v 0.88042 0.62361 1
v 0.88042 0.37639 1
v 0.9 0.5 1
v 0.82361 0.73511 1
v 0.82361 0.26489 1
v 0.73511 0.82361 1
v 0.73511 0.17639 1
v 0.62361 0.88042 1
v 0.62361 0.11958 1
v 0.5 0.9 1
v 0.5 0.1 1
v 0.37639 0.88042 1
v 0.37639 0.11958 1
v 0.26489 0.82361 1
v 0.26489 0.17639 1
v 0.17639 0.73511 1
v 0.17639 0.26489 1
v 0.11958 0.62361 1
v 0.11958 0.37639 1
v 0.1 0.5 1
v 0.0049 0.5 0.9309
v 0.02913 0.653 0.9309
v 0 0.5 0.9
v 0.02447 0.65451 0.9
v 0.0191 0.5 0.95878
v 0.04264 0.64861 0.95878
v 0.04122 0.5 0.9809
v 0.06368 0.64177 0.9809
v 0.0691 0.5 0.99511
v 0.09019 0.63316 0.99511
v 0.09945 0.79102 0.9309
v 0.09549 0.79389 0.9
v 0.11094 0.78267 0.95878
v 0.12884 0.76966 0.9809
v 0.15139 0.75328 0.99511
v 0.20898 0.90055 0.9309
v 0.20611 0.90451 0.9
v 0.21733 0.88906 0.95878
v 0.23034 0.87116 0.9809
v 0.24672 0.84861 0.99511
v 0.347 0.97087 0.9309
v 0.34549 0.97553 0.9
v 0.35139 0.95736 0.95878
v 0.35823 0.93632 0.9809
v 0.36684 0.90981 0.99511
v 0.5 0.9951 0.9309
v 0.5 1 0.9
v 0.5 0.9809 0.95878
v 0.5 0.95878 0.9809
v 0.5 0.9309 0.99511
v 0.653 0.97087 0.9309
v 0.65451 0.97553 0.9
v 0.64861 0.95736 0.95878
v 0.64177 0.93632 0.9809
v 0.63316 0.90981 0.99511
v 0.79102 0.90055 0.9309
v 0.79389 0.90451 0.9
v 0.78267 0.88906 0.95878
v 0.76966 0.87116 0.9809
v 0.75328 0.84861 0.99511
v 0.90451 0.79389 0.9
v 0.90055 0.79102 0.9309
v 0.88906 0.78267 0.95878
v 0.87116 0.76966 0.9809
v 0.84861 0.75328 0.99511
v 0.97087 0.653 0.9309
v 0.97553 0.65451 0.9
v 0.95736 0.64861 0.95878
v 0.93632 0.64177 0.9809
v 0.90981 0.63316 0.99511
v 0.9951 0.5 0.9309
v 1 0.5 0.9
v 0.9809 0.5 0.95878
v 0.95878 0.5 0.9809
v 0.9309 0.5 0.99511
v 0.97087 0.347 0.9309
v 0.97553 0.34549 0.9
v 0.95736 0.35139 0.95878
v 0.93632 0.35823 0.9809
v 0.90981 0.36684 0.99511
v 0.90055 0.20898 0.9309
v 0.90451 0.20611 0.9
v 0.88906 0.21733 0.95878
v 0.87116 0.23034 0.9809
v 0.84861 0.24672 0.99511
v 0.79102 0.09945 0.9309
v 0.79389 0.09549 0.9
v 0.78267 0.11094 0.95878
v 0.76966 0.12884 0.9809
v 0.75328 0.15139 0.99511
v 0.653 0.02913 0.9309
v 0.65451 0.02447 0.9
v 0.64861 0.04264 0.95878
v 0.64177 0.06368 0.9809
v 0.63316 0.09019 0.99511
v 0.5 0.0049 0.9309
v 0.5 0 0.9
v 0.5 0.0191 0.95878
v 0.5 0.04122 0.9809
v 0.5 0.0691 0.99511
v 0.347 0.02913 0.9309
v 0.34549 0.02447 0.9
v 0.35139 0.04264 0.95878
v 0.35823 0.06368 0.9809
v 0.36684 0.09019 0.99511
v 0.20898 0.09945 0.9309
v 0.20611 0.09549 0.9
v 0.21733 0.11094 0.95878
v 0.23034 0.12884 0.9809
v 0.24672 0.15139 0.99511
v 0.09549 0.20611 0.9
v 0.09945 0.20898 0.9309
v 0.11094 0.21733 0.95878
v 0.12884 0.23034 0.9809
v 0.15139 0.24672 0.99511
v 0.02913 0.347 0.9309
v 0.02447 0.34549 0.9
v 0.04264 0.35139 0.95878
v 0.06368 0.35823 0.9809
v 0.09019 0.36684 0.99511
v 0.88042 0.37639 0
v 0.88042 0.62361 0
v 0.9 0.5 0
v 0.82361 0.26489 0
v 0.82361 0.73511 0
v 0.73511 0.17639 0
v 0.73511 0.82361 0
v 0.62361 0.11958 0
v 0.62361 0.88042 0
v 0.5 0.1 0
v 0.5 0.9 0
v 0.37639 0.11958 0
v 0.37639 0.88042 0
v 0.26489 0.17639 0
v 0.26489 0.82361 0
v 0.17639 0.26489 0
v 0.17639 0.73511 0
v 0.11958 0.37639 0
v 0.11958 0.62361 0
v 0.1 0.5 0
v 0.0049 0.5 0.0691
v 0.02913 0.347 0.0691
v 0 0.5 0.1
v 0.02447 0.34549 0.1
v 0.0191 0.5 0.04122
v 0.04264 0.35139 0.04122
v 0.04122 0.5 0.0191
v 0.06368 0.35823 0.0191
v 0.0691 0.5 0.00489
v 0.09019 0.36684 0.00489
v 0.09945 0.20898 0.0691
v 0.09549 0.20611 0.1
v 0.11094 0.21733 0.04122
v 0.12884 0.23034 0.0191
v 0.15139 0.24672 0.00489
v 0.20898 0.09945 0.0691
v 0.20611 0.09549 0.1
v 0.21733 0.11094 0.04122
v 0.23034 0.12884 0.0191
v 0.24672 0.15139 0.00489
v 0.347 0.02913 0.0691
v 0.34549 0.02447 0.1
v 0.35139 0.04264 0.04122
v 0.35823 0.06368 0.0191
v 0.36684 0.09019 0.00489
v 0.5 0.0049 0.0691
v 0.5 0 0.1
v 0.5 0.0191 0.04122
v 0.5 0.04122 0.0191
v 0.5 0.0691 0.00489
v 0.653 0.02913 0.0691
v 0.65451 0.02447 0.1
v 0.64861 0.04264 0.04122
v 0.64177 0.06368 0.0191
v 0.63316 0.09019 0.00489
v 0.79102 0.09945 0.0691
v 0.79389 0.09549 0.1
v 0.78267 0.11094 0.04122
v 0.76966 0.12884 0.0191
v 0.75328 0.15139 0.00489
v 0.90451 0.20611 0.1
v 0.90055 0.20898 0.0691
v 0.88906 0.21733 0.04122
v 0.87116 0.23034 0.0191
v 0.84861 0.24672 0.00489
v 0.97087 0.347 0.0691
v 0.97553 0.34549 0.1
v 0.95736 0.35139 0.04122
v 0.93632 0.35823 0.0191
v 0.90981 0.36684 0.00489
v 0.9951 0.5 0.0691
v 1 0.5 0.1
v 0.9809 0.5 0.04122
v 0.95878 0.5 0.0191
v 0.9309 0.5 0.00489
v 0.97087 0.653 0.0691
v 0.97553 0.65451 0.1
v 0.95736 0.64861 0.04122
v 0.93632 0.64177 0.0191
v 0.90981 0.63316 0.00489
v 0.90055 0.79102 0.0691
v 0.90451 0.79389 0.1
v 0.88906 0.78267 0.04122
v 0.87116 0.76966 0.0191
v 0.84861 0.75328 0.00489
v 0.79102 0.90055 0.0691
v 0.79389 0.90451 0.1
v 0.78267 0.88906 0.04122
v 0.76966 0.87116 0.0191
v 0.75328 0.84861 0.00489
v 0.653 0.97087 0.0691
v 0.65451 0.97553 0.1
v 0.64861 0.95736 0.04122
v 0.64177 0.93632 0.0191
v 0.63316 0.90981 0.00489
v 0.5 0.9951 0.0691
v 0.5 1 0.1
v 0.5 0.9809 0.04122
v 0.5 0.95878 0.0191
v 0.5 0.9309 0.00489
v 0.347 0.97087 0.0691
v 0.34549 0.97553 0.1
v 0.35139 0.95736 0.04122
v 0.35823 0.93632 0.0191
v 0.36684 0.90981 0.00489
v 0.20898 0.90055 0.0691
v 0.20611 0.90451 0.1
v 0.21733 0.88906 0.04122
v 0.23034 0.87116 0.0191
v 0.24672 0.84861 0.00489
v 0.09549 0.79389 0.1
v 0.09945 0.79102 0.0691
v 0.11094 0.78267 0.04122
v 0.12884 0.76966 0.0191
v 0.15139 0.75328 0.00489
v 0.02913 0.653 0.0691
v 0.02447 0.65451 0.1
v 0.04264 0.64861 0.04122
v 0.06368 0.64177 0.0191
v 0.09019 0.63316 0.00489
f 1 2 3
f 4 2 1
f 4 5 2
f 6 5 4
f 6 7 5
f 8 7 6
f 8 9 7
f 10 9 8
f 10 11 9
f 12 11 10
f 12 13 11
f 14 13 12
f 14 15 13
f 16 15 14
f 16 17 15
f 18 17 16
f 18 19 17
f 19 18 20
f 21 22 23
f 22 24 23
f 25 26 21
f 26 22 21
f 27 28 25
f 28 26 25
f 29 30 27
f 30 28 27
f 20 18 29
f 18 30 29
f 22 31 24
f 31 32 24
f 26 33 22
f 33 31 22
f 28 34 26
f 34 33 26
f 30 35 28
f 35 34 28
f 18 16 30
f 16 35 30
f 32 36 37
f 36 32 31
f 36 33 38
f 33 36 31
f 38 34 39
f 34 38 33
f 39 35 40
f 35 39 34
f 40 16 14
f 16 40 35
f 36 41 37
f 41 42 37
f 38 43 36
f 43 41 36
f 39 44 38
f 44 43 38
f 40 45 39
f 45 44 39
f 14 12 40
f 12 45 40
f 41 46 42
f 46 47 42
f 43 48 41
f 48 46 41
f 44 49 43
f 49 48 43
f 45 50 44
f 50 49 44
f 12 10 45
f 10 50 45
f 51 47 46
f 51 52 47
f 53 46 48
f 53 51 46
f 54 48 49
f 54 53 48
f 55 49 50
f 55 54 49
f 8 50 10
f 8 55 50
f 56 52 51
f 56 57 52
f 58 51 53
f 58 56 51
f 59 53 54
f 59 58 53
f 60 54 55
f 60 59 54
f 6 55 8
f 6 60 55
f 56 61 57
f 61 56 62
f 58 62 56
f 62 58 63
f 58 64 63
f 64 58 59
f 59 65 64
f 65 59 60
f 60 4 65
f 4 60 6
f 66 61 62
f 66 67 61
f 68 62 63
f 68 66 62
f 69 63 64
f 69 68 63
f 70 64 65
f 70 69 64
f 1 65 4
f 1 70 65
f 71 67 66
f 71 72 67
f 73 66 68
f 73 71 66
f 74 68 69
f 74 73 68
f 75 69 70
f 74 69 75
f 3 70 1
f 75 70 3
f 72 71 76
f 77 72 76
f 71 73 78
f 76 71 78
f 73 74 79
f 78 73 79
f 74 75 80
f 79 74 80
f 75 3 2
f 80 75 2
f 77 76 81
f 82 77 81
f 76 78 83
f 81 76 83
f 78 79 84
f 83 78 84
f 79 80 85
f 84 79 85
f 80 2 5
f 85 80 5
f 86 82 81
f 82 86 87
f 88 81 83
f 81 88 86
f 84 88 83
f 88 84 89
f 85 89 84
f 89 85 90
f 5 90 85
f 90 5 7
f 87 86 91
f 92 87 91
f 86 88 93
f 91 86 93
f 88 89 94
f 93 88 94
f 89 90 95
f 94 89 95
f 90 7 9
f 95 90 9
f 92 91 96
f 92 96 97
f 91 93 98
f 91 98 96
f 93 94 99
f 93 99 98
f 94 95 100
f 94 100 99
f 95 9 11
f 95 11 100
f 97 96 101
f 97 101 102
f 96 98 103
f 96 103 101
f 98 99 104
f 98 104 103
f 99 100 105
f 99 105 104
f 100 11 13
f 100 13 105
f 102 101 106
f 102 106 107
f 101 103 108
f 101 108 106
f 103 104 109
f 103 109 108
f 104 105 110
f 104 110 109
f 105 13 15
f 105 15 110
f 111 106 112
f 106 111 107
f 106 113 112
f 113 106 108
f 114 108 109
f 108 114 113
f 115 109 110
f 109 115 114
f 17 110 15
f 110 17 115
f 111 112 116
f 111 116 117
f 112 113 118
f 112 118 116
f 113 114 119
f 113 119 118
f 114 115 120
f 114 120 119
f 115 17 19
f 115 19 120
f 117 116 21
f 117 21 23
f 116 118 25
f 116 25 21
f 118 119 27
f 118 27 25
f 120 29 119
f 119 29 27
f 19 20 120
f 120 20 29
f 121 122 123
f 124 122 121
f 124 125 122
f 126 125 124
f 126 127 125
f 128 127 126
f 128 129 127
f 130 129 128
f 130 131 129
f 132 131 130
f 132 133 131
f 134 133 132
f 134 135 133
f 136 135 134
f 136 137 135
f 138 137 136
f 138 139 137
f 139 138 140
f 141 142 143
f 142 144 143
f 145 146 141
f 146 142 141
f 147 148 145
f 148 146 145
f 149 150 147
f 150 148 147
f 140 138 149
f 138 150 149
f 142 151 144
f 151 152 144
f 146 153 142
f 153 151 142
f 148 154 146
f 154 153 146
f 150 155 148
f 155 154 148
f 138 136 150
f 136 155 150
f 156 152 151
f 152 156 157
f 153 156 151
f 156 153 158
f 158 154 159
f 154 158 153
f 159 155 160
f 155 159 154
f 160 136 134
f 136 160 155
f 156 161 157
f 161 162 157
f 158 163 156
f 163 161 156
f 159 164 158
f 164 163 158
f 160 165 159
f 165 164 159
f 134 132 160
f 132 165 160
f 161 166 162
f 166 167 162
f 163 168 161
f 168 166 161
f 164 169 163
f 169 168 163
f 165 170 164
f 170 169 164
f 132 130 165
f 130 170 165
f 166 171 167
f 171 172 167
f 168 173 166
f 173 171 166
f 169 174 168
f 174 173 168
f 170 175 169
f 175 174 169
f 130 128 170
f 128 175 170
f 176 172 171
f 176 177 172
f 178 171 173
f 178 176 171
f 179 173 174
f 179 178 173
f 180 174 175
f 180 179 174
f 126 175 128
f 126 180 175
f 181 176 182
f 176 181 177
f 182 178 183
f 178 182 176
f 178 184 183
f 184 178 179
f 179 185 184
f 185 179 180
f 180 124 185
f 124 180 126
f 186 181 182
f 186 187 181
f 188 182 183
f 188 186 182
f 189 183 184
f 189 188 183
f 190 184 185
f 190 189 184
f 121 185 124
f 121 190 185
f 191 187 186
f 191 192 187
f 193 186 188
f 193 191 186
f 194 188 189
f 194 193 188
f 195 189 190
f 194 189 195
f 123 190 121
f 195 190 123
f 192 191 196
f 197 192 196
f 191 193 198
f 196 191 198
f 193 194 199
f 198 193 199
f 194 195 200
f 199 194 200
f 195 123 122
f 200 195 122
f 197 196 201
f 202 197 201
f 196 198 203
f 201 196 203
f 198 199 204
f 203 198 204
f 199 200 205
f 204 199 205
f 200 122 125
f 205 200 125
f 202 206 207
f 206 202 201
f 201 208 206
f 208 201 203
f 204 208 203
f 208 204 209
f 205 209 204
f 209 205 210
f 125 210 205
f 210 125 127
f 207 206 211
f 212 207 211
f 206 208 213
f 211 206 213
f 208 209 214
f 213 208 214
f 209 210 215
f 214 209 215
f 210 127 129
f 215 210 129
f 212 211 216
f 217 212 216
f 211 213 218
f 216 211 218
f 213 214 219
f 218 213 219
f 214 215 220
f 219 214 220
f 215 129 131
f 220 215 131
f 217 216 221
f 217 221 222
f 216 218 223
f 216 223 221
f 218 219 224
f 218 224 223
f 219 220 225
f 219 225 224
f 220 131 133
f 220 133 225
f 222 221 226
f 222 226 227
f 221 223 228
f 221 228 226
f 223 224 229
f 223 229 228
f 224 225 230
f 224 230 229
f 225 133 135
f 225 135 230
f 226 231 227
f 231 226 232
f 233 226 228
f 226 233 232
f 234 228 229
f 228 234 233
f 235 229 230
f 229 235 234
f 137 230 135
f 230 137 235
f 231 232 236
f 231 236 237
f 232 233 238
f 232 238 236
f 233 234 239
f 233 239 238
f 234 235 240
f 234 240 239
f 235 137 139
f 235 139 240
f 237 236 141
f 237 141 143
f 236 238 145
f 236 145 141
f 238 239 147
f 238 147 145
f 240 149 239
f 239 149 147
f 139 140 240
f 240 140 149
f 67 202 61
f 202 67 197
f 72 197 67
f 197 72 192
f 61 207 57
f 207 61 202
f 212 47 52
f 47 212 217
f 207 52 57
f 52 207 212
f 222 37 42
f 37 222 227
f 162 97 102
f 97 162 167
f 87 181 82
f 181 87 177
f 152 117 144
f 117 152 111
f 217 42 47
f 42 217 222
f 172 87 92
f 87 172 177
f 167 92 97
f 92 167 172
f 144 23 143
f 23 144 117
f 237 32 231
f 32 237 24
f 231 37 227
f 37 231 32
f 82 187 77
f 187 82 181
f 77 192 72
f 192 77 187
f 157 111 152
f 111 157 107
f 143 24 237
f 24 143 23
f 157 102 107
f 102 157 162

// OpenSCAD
// file: Constants.scad
    // Spring
CLOCKWIRE = [-1];
ANTICLOCKWIRE = [1];

    // Gears
RIGHT_HAND = [-1];
LEFT_HAND = [1];

    // Knurling orientation
HORIZONTAL  = [123];    // Arbitrary values
VERTICAL    = [-123];

    // Vectors
TRANS_Null   = [0,  0,  0];
TRANS_Top    = [0,  0,  1];
TRANS_Bot    = [0,  0,  -1];
TRANS_Frt    = [0,  -1, 0];
TRANS_Back   = [0,  1,  0];
TRANS_Rgt    = [1,  0,  0];
TRANS_Lft    = [-1, 0,  0];
TRANS_AllPos = [1,  1,  1];
TRANS_AllNeg = [-1, -1, -1];

    // Rotations
ROT_Top     = [0,   0,   0];
ROT_Bot     = [180, 0,   0];
ROT_Frt     = [90,  0,   0];
ROT_Back    = [-90, 0,   0];
ROT_Rgt     = [0,   90,  0];
ROT_Lft     = [0,   -90, 0];

    // Orient
ORIENT_1 = [0];
ORIENT_2 = [90];
ORIENT_3 = [180];
ORIENT_4 = [-90];

/*
               A
              / Y
    A        /
  Z |   ___________
    | / |         /|
    |/  |        / |
    /___________/  |
    |   ._ _ _ _|_ |
    |  /        | /
    | /         |/
    |/__________/  _ _ _>
                      X

    Les arrêtes sont défini à partir de cette vu 3D d'un cube. (L'orientation des axes est important pour l'utilisation ultérieur)
    En considérant le repère au centre du cube, le première face comme étant Front, celle du dessus Top, . . .
    Une arrête est représenté par la matrice de translation associée
*/

    // Edges

// Edges of plans
EDGE_Top    = [[1, 0, 0, 0],  [0, 1, 0, 0],  [0, 0, 1, 1],  [0, 0, 0, 1]];  // Top edges position
EDGE_Bot    = [[1, 0, 0, 0],  [0, 1, 0, 0],  [0, 0, 1, -1], [0, 0, 0, 1]]; // Bottom edges position
EDGE_Frt    = [[1, 0, 0, 0],  [0, 1, 0, -1], [0, 0, 1, 0],  [0, 0, 0, 1]]; // Front edges position
EDGE_Back   = [[1, 0, 0, 0],  [0, 1, 0, 1],  [0, 0, 1, 0],  [0, 0, 0, 1]];  // Back edges position
EDGE_Rgt    = [[1, 0, 0, 1],  [0, 1, 0, 0],  [0, 0, 1, 0],  [0, 0, 0, 1]];  // Right edges position
EDGE_Lft    = [[1, 0, 0, -1], [0, 1, 0, 0],  [0, 0, 1, 0],  [0, 0, 0, 1]]; // Left edges position

// Unique edge:
EDGE_TopFrt     = EDGE_Top * EDGE_Frt;
EDGE_TopBack    = EDGE_Top * EDGE_Back;
EDGE_TopRgt     = EDGE_Top * EDGE_Rgt;
EDGE_TopLft     = EDGE_Top * EDGE_Lft;

EDGE_BotFrt     = EDGE_Bot * EDGE_Frt;
EDGE_BotBack    = EDGE_Bot * EDGE_Back;
EDGE_BotRgt     = EDGE_Bot * EDGE_Rgt;
EDGE_BotLft     = EDGE_Bot * EDGE_Lft;

EDGE_BackTop    = EDGE_TopBack;
EDGE_BackBot    = EDGE_BotBack;
EDGE_BackRgt    = EDGE_Back * EDGE_Rgt;
EDGE_BackLft    = EDGE_Back * EDGE_Lft;

EDGE_FrtTop     = EDGE_TopFrt;
EDGE_FrtBot     = EDGE_BotFrt;
EDGE_FrtRgt     = EDGE_Frt * EDGE_Rgt;
EDGE_FrtLft     = EDGE_Frt * EDGE_Lft;

EDGE_RgtTop     = EDGE_TopRgt;
EDGE_RgtBot     = EDGE_BotRgt;
EDGE_RgtFrt     = EDGE_FrtRgt;
EDGE_RgtBack    = EDGE_BackRgt;

EDGE_LftTop     = EDGE_TopLft;
EDGE_LftBot     = EDGE_BotLft;
EDGE_LftFrt     = EDGE_FrtLft;
EDGE_LftBack    = EDGE_BackLft;

EDGE_All        = [EDGE_FrtLft, EDGE_TopLft, EDGE_BotLft];
// file: Transforms.scad
include<Constants.scad>
use<Basics.scad>
use<Matrix.scad>

/*
* rotX(ang: trigonometric rotation angle around X (in degrees))
*
* Result: rotates $children around the X-axis
*/
module rotX(ang= 0){

    for(i= [0 : $children - 1]){

        multmatrix(m= matRotX(ang)){

            children(i);
        }
    }
}

/*
* rotY(ang: trigonometric rotation angle around Y (in degrees))
*
* Result: rotates $children around the Y-axis
*/
module rotY(ang= 0){

    for(i= [0 : $children - 1]){

        multmatrix(m= matRotY(ang)){

            children(i);
        }
    }
}

/*
* rotZ(ang: trigonometric rotation angle around Z (in degrees))
*
* Result: rotates $children around the Z-axis
*/
module rotZ(ang= 0){

    for(i= [0 : $children - 1]){

        multmatrix(m= matRotZ(ang)){

            children(i);
        }
    }
}

/*
* mRotate(ang: respectively the trigonometric rotation angles around [X, Y, Z] (in degrees))
*
* Result: rotates $children around all axis
*/
module mRotate(ang= [0, 0, 0]){

    assertion(len(ang) == 3, "ang should be a 3D vector");

    for(i= [0 : $children - 1]){

        multmatrix(m= matRot(ang)){

            children(i);
        }
    }
}

/*
* mTranslate(v: respectively the translation on [X, Y, Z] axis)
*
* Result: translates $children across all axis
*/
module mTranslate(v= [0, 0, 0]){

    assertion(len(v) == 3, "v should be a 3D vector");

    for(i= [0 : $children - 1]){

        multmatrix(m= matTrans(v)){

            children(i);
        }
    }
}

/*
* mScale(k: uniform scaling)
*
* Result: scales $children
*/
module mScale(k= [1, 1, 1]){

    assertion(len(k) == 3, "v should be a 3D vector");

    for(i= [0 : $children - 1]){

        multmatrix(m= matScale([ifNullGetUnit(k.x), ifNullGetUnit(k.y), ifNullGetUnit(k.z)])){

            children(i);
        }
    }
}

module transform(m= matScale([1, 1, 1])){

    for(i= [0 : $children - 1]){

        multmatrix(m= m){

            children(i);
        }
    }
}
// file: Vector.scad
use<Basics.scad>

/*
* makeVector(u: first vector,
*            v: second vector)
*
* Return:
*   Get mathématical vector uv.
 */
function makeVector(u= [0, 0, 0], v= [0, 0, 0]) =  v - u;

/*
* middleVector(u: first vector,
*              v: second vector)
*
* Return:
*   Coordonates of the center of the vector uv.
 */
function middleVector(u= [1, 1, 1], v= [1, 1, 1]) = (u + v)/2;

//function produitVectoriel EXIST: cross

/*
* mod(v: vector)
*
* Return:
*   The module of the vector v.
 */
function mod(v= undef) = (isUndef(v) ? 0 : sqrt(v*v));

/*
* angleVectors(u: first vector,
*              v: second vector)
*
* Return:
*   The oriented angle between u and v.
 */
function angleVectors(u= [1, 0, 0], v= [0, 1, 0]) =
    (len(u) == len(v) ? (acos((u*v)/(mod(u)*mod(v)))
                    ) : (
                         echoError(msg= "u and v must have the same length"))
    );

/*
* matVectRotX(ang: angle in degree)
*
* Return:
*   X-axis rotation matrix of a 3D vector
*/
function matVectRotX(ang= 0) = [[1, 0,        0],
                                [0, cos(ang), -sin(ang)],
                                [0, sin(ang), cos(ang)]];

/*
* applyVectRotX(v: vector to be rotated along the X-axis,
*               ang: angle in degree)
*
* Return:
*   The vector v rotated along the X-axis.
 */
function applyVectRotX(v= [1, 1, 1], ang= 0) = v*matVectRotX(ang);

/*
* matVectRotY(ang: angle in degree)
*
* Return:
*   Y-axis rotation matrix of a 3D vector
*/
function matVectRotY(ang= 0) = [[cos(ang),  0, sin(ang)],
                                [0,         1, 0],
                                [-sin(ang), 0, cos(ang)]];

/*
* applyVectRotY(v: vector to be rotated along the Y-axis,
*               ang: angle in degree)
*
* Return:
*   The vector v rotated along the Y-axis.
 */
function applyVectRotY(v= [1, 1, 1], ang= 0) = v*matVectRotY(ang);

/*
* matVectRotZ(ang: angle in degree)
*
* Return:
*   Z-axis rotation matrix of a 3D vector
*/
function matVectRotZ(ang= 0) = [[cos(ang), -sin(ang), 0],
                                [sin(ang), cos(ang),  0],
                                [0,        0,         1]];

/*
* applyVectRotZ(v: vector to be rotated along the Z-axis,
*               ang: angle in degree)
*
* Return:
*   The vector v rotated along the Z-axis.
 */
function applyVectRotZ(v= [1, 1, 1], ang= 0) = v*matVectRotZ(ang);


/*
* matVectRot(ang: angles vector [angX, angY, angZ] in degree)
*
* Return:
*   Matrix of rotations according to the vector [angX, angY, angZ] of a 3D vector.
*/
function matVectRot(ang= [0, 0, 0]) = matVectRotX(ang.x)*matVectRotY(ang.y)*matVectRotZ(ang.z);


/*
* applyVectRot(v: vector to be rotated along all axis,
*               ang: angles vector [angX, angY, angZ] in degree)
*
* Return:
*   The vector v rotated along all axis.
 */
function applyVectRot(v= [1, 1, 1], ang= [0,0,0]) = v*matVectRot(ang);
// file: Matrix.scad
use<Basics.scad>
include<Constants.scad>

/*
* Representation of a linear transformation matrix :
*
*      [[Scale X]	        [Shear X along Y]	[Shear X along Z]	[Translate X]
*       [Shear Y along X]	[Scale Y]	        [Shear Y along Z]	[Translate Y]
*       [Shear Z along X]	[Shear Z along Y]	[Scale Z]	        [Translate Z]
*       [0]                  [0]                 [0]                 [1]]
*/

/*
* matrix(...) :
*
* [[scalX]  [shXalY]    [shXalZ]	[transX]
*  [shYalX]	[scalY]	    [shYalZ]	[transY]
*  [shZalX]	[shZalY]	[scalZ]	    [transZ]
*  [0]      [0]         [0]         [1]]
*
* Returns: the associated linear transformation matrix
*/
function matrix(scalX= 1,
                scalY= 1,
                scalZ= 1,
                transX= 0,
                transY= 0,
                transZ= 0,
                shYalX= 0,
                shZalX= 0,
                shXalY= 0,
                shZalY= 0,
                shXalZ= 0,
                shYalZ= 0) = [[ifNullGetUnit(scalX), shXalY,               shXalZ,               transX],
                              [shYalX,               ifNullGetUnit(scalY), shYalZ,               transY],
                              [shZalX,               shZalY,               ifNullGetUnit(scalZ), transZ],
                              [0,                    0,                    0,                    1]];

/*
* matrix(...) :
*
* [[scal.x]     [shXalY]    [shXalZ]	[trans.x]
*  [shYalX]	    [scal.y]	[shYalZ]	[trans.y]
*  [shZalX]	    [shZalY]	[scal.z]    [trans.z]
*  [0]          [0]         [0]         [1]]
*
* Returns: the associated linear transformation matrix
*/
function matrix(scal= [1, 1, 1],
                trans= [0, 0, 0],
                shYalX= 0,
                shZalX= 0,
                shXalY= 0,
                shZalY= 0,
                shXalZ= 0,
                shYalZ= 0) = [[ifNullGetUnit(scal.x), shXalY,                shXalZ,                trans.x],
                              [shYalX,                ifNullGetUnit(scal.y), shYalZ,                trans.y],
                              [shZalX,                shZalY,                ifNullGetUnit(scal.z), trans.z],
                              [0,                     0,                     0,                     1]];

/*
* matRotX(ang: trigonometric rotation angle around X (in degrees))
*
* Returns: the associated linear transformation matrix
 */
function matRotX(ang= 0) = [[1, 0,        0,         0],
                            [0, cos(ang), -sin(ang), 0],
                            [0, sin(ang), cos(ang),  0],
                            [0, 0,        0,         1]];

/*
* matRotY(ang: trigonometric rotation angle around Y (in degrees))
*
* Returns: the associated linear transformation matrix
 */
function matRotY(ang= 0) = [[cos(ang),  0, sin(ang), 0],
                            [0,         1, 0,        0],
                            [-sin(ang), 0, cos(ang), 0],
                            [0,         0, 0,        1]];

/*
* matRotX(ang: trigonometric rotation angle around Z (in degrees))
*
* Returns: the associated linear transformation matrix
 */
function matRotZ(ang= 0) = [[cos(ang), -sin(ang), 0, 0],
                            [sin(ang), cos(ang),  0, 0],
                            [0,        0,         1, 0],
                            [0,        0,         0, 1]];

/*
* matRotX(ang: respectively the trigonometric rotation angles around [X, Y, Z] (in degrees))
*
* Returns: the associated linear transformation matrix
 */
function matRot(ang= [0, 0, 0]) = matRotX(ang.x)*matRotY(ang.y)*matRotZ(ang.z);

/*
* matTrans(v: respectively the translation on [X, Y, Z] axis)
*
* Returns: the associated linear transformation matrix
 */
function matTrans(v= [0, 0, 0]) = [[1, 0, 0, v.x],
                                   [0, 1, 0, v.y],
                                   [0, 0, 1, v.z],
                                   [0, 0, 0, 1]];

/*
* matScale(v: respectively the [X, Y, Z] scaling)
*
* Returns: the associated linear transformation matrix
 */
function matScale(v= [1, 1, 1]) = [[ifNullGetUnit(v.x), 0,                  0,                  0],
                                   [0,                  ifNullGetUnit(v.y), 0,                  0],
                                   [0,                  0,                  ifNullGetUnit(v.z), 0],
                                   [0,                  0,                  0,                  1]];

/*
* matTrans(k: uniform scaling)
*
* Returns: the associated linear transformation matrix
 */
function matScale(k= 1) = [[ifNullGetUnit(k), 0,                0,                0],
                           [0,                ifNullGetUnit(k), 0,                0],
                           [0,                0,                ifNullGetUnit(k), 0],
                           [0,                0,                0,                1]];

/*
* scaleEdge(k: scalar,
*           e: edge to apply the scalar)
*
* Returns: the associated linear transformation matrix
 */
function scaleEdge(k, e) = matrix(trans= [k*e[0][3], k*e[1][3], k*e[2][3]],
                                  scal= [e[0][0], e[1][1], e[2][2]],
                                  shYalX= e[1][0],
                                  shZalX= e[2][0],
                                  shXalY= e[0][1],
                                  shZalY= e[2][1],
                                  shXalZ= e[0][2],
                                  shYalZ= e[1][2]);
// file: Basics.scad
use<Transforms.scad>
include<Constants.scad>

/*
* isDef(u: any variable)
*/
function isDef(u) = ((version_num() > 20190100) ? !isUndef(u) : (u != undef));

/*
* isUndef(u: any variable)
*/
function isUndef(u) = ((version_num() > 20190100) ? (u == undef) : !isDef(u));

/*
* echoMsg(msg : message to write in the console)
*/
function echoMsg(msg) = (isDef(msg) ? echo(msg) : 0);

/*
* echoError(msg: message to write in the console, string,
*           pfx: error prefix, by default as "ERROR")
*/
module echoError(msg, pfx="ERROR"){

    echo(str("<p style=\"background-color: #ffb0b0\"><b>", pfx, ":</b> ", msg, "</p>"));
}

function echoError(msg, pfx= "ERROR") = echoMsg(str("<p style=\"background-color: #ffb0b0\"><b>", pfx, ":</b> ", msg, "</p>"));

/*
* assertion(succ: bool, if the test is false, echo an error
*           msg: message to write in the console if succ is false)
*/
function assertion(succ, msg) = (version_num() > 20190100) ? let(FAILED = succ) assert(FAILED, msg) : 0;

module assertion(succ, msg){

    if(version_num() > 20190100) {

        FAILED = succ;
        assert(FAILED, msg);
    }
    else if(!succ){

        echo_error(msg);
    }
}

/*
* ifNullGetUnit(value: variable to test)
*/
function ifNullGetUnit(value) = (isUndef(value) || (value == 0) ? 1 : value);

    // Geometrical values

/*
* regularDiameter(nbS: number of sides,
*                 lengthS: length of a side)
*/
function regularDiameter(nbS= 4, lengthS= 1) =
    (nbS > 2 ? (
                lengthS/cos(360/(2*nbS))
           ) : (
                echoError("nbS must be greater than 2"))
    );

/*
* regularRadius(nbS: number of sides,
*               lengthS: length of a side)
*/
function regularRadius(nbS= 4, lengthS= 1) =
    (nbS > 2 ? (
                lengthS/(2*cos(360/(2*nbS)))
           ) : (
                echoError("nbS must be greater than 2"))
    );

/*
* writeOnFace(pos: position on the face,
*             text: parameter of openscad text() function refer to https://en.wikibooks.org/wiki/OpenSCAD_User_Manual/Text,
*             size: parameter of openscad text() function,
*             font: parameter of openscad text() function,
*             halign: parameter of openscad text() function,
*             spacing: parameter of openscad text() function,
*             direction: parameter of openscad text() function,
*             language: parameter of openscad text() function,
*             script: parameter of openscad text() function,
*             fn: parameter of openscad text() function,
*             h: height of th texte added,
*             rot: use sum of constants ROT_* for orient the hole OR custom rotation vector as
*                  [angX, angY, anfZ], note that the rotation is in the anti-clockwise direction,
*             diff: if true pierce the face with a depth of h, otherwise add the texte with a height of h)
*/
module writeOnFace(pos= [0, 0, 0], color= "white", text= "Test", size= 1, font, halign, valign, spacing, direction, language, script, fn= 30, h= 0.1, rot= ROT_Top, diff= false){

    assertion(len(pos) == 3, "pos should be a 3D vector");
    assertion(0 < h, "h shouldbe greater than 0");
    assertion(len(rot) == 3, "rot should be a 3D vector");

    if(diff){

        difference(){

            children();

            color(color)
                mTranslate(pos)
                    mRotate(rot)
                        mTranslate([0, 0, -h])
                            linear_extrude(h + 0.01)
                                text(text= text, size= size, font= font, halign= halign, valign= valign, spacing= spacing, direction= direction, language= language, script= script, $fn= fn);
        }
    }
    else{

        union(){

            children();

            color(color)
                mTranslate(pos)
                    mRotate(rot)
                        mTranslate([0, 0, -0.01])
                            linear_extrude(h + 0.01)
                                text(text= text, size= size, font= font, halign= halign, valign= valign, spacing= spacing, direction= direction, language= language, script= script, $fn= fn);
        }
    }
}

/*
writeOnFace(pos= [0, 0, 5], text= "Top", color= "grey", size= 3, valign= "center", halign= "center")
writeOnFace(pos= [0, 5, 0], text= "Back", color= "grey", size= 3, valign= "center", halign= "center", rot= ROT_Back + [0, 0, 180])
writeOnFace(pos= [0, -5, 0], text= "Front", color= "grey", size= 3, valign= "center", halign= "center", rot= ROT_Frt)
writeOnFace(pos= [5, 0, 0], text= "Right", color= "grey", size= 3, valign= "center", halign= "center", rot= ROT_Rgt + [0, 0, 90])
writeOnFace(pos= [-5, 0, 0], text= "Left", color= "grey", size= 3, valign= "center", halign= "center", rot= ROT_Lft + [0, 0, -90])
writeOnFace(pos= [0, 0, -5], text= "Bottom", color= "grey", size= 2, valign= "center", halign= "center", rot= ROT_Bot)
    cube(10, center= true);
*/

/*
* factorial(n: integer)
*
* Warning only integer or you will get an error on the recursion
*/
function factorial(n) = (n == 0 ? 1 : factorial(n - 1)*n);

/*
* choose(n: top coefficient,
*        k: bottom coefficient)
*
* Warning only integer or you will get an error on the recursion
*/
function choose(n, k) =
    ((n >= k) && (k >= 0) ? (factorial(n)/(factorial(k)*factorial(n - k))
                        ) : (
                             echoError(msg= "n should be greater or equal than k and k should be greater or equal than 0"))
    );

function getTranslateRot(rot) =
    ((rot == ROT_Top) ? ([0, 0, 1]
                    ) : (
                         ((rot == ROT_Bot) ? ([0, 0, -1]
                                         ) : (
                                              ((rot == ROT_Frt) ? ([0, -1, 0]
                                                              ) : (
                                                                   ((rot == ROT_Back) ? ([0, 1, 0]
                                                                                    ) : (
                                                                                         ((rot == ROT_Rgt) ? ([1, 0, 0]
                                                                                                         ) : (
                                                                                                              ([-1, 0, 0])))))))))));
// main file
use<Basics.scad>
use<Matrix.scad>
use<Vector.scad>
use<Transforms.scad>
include<Constants.scad>

/*
* colorCube(size: size of the cube)
*
* Result:
*   Centered colored cube.
*/
module colorCube(size= 1){

    assertion(0 < size, "size should be greater than 0");
    s = size/2;

    union(){

        color([0, 0, 0])
            cube([s, s, s]);

        color([1, 0, 0])
            translate([-s, 0, 0])
                cube([s, s, s]);

        color([0, 1, 0])
            translate([0, -s, 0])
                cube([s, s, s]);

        color([0, 0, 1])
            translate([0, 0, -s])
                cube([s, s, s]);

        color([1, 1, 0])
            translate([-s, -s, 0])
                cube([s, s, s]);

        color([1, 0, 1])
            translate([-s, 0, -s])
                cube([s, s, s]);

        color([0, 1, 1])
            translate([0, - s, - s])
                cube([s, s, s]);

        color([1, 1, 1])
            translate([- s, - s, - s])
                cube([s, s, s]);
    }
}

/*
writeOnFace(pos= [0, 0, 5], text= "Top", color= "grey", size= 3, valign= "center", halign= "center")
writeOnFace(pos= [0, 5, 0], text= "Back", color= "grey", size= 3, valign= "center", halign= "center", rot= ROT_Back + [0, 0, 180])
writeOnFace(pos= [0, -5, 0], text= "Front", color= "grey", size= 3, valign= "center", halign= "center", rot= ROT_Frt)
writeOnFace(pos= [5, 0, 0], text= "Right", color= "grey", size= 3, valign= "center", halign= "center", rot= ROT_Rgt + [0, 0, 90])
writeOnFace(pos= [-5, 0, 0], text= "Left", color= "grey", size= 3, valign= "center", halign= "center", rot= ROT_Lft + [0, 0, -90])
writeOnFace(pos= [0, 0, -5], text= "Bottom", color= "grey", size= 2, valign= "center", halign= "center", rot= ROT_Bot)
    colorCube(10);
*/

    // Chamfers :
module chamferBase(chamfer, size){

    rotZ(45)
       cube([sqrt(2)*chamfer, sqrt(2)*chamfer, size + 0.01], center= true);
}

/*
* chamferCube(chamfer: chamfer size (chamfer < min(size)/2),
*             size: the size of the cube according to [X, Y, Z],
*             pos: position to place the cube,
*             rot: use sum of constants ROT_* for orient the cube OR custom rotation vector as
*                  [angX, angY, anfZ], note that the rotation is in the anti-clockwise direction,
*             edges: vector of the edges to be chamfered,
*             center: boolean, centrer or not the cube)
*/
module chamferCube(chamfer= 0.1, size= [1, 1, 1], pos= [0, 0, 0], rot= ROT_Top, edges= EDGE_All, center= false){

    assertion((0 < chamfer) && (chamfer < min(size)/2), "chamfer should be greater than 0 and less than half of the smallest size of the cube");
    assertion(len(size) == 3, "size should be a 3D vector");
    for(i= [0 : 2]){

        assertion(0 < size[i], "The size of the cube should be greater than 0");
    }

    assertion(len(pos) == 3, "pos should be a 3D vector");
    assertion(len(rot) == 3, "rot should be a 3D vector");
    assertion(len(edges) != 0, "You should give a vector containing at least one edge constant");

    mTranslate((center ? pos : pos + size*1/2)){
        mRotate(rot){

            if(edges == EDGE_All){

                difference(){

                    cube(size, center = true);

                    for(r = [0, 1]){

                        union(){

                            transform(matRotZ(r*180)*scaleEdge(size.z/2, EDGE_Top)*scaleEdge(size.x/2, EDGE_Lft)*matRotX(90))
                                chamferBase(chamfer, size.y);

                            transform(matRotZ(r*180)*scaleEdge(size.z/2, EDGE_Bot)*scaleEdge(size.x/2, EDGE_Lft)*matRotX(90))
                                chamferBase(chamfer, size.y);

                            transform(matRotZ(r*180)*scaleEdge(size.z/2, EDGE_Top)*scaleEdge(size.y/2, EDGE_Frt)*matRotY(90))
                                chamferBase(chamfer, size.x);

                            transform(matRotZ(r*180)*scaleEdge(size.z/2, EDGE_Bot)*scaleEdge(size.y/2, EDGE_Frt)*matRotY(90))
                                chamferBase(chamfer, size.x);

                            transform(matRotZ(r*180)*scaleEdge(size.y/2, EDGE_Back)*scaleEdge(size.x/2, EDGE_Lft))
                                chamferBase(chamfer, size.z);

                            transform(matRotZ(r*180)*scaleEdge(size.y/2, EDGE_Frt)*scaleEdge(size.x/2, EDGE_Lft))
                                chamferBase(chamfer, size.z);
                        }
                    }
                }
            }
            else{

                difference(){

                    cube(size, center = true);

                    for(i= [0 : len(edges) - 1]){

                        if((edges[i] == EDGE_Top) || (edges[i] == EDGE_Bot)){

                            for(r = [0, 1]){

                                union(){

                                    transform(matRotZ(r*180)*scaleEdge(size.z/2, edges[i])*scaleEdge(size.x/2, EDGE_Lft)*matRotX(90))
                                        chamferBase(chamfer, size.y);

                                    transform(matRotZ(r*180)*scaleEdge(size.z/2, edges[i])*scaleEdge(size.y/2, EDGE_Frt)*matRotY(90))
                                        chamferBase(chamfer, size.x);
                                }
                            }
                        }
                        else if((edges[i] == EDGE_Back) || (edges[i] == EDGE_Frt)){

                            for(r = [0, 1]){

                                union(){

                                    transform(matRotY(r*180)*scaleEdge(size.y/2, edges[i])*scaleEdge(size.x/2, EDGE_Lft))
                                        chamferBase(chamfer, size.z);

                                    transform(matRotY(r*180)*scaleEdge(size.y/2, edges[i])*scaleEdge(size.z/2, EDGE_Top)*matRotY(90))
                                        chamferBase(chamfer, size.x);
                                }
                            }
                        }
                        else if((edges[i] == EDGE_Rgt) || (edges[i] == EDGE_Lft)){

                            for(r = [0, 1]){

                                union(){

                                    transform(matRotX(r*180)*scaleEdge(size.x/2, edges[i])*scaleEdge(size.y/2, EDGE_Back))
                                        chamferBase(chamfer, size.z);

                                    transform(matRotX(r*180)*scaleEdge(size.x/2, edges[i])*scaleEdge(size.z/2, EDGE_Top)*matRotX(90))
                                        chamferBase(chamfer, size.y);
                                }
                            }
                        }
                        else if((edges[i] == EDGE_TopFrt) || (edges[i] == EDGE_FrtTop)){

                            transform(scaleEdge(size.z/2, EDGE_Top)*scaleEdge(size.y/2, EDGE_Frt)*matRotY(90))
                                chamferBase(chamfer, size.x);
                        }
                        else if((edges[i] == EDGE_TopBack) || (edges[i] == EDGE_BackTop)){

                            transform(scaleEdge(size.z/2, EDGE_Top)*scaleEdge(size.y/2, EDGE_Back)*matRotY(90))
                                chamferBase(chamfer, size.x);
                        }
                        else if((edges[i] == EDGE_BotBack) || (edges[i] == EDGE_BackBot)){

                            transform(scaleEdge(size.z/2, EDGE_Bot)*scaleEdge(size.y/2, EDGE_Back)*matRotY(90))
                                chamferBase(chamfer, size.x);
                        }
                        else if((edges[i] == EDGE_BotFrt) || (edges[i] == EDGE_FrtBot)){

                            transform(scaleEdge(size.z/2, EDGE_Bot)*scaleEdge(size.y/2, EDGE_Frt)*matRotY(90))
                                chamferBase(chamfer, size.x);
                        }
                        else if((edges[i] == EDGE_TopRgt) || (edges[i] == EDGE_RgtTop)){

                            transform(scaleEdge(size.z/2, EDGE_Top)*scaleEdge(size.x/2, EDGE_Rgt)*matRotX(90))
                                chamferBase(chamfer, size.y);
                        }
                        else if((edges[i] == EDGE_TopLft) || (edges[i] == EDGE_LftTop)){

                            transform(scaleEdge(size.z/2, EDGE_Top)*scaleEdge(size.x/2, EDGE_Lft)*matRotX(90))
                                chamferBase(chamfer, size.y);
                        }
                        else if((edges[i] == EDGE_BotRgt) || (edges[i] == EDGE_RgtBot)){

                            transform(scaleEdge(size.z/2, EDGE_Bot)*scaleEdge(size.x/2, EDGE_Rgt)*matRotX(90))
                                chamferBase(chamfer, size.y);
                        }
                        else if((edges[i] == EDGE_BotLft) || (edges[i] == EDGE_LftBot)){

                            transform(scaleEdge(size.z/2, EDGE_Bot)*scaleEdge(size.x/2, EDGE_Lft)*matRotX(90))
                                chamferBase(chamfer, size.y);
                        }
                        else if((edges[i] == EDGE_BackRgt) || (edges[i] == EDGE_RgtBack)){

                            transform(scaleEdge(size.y/2, EDGE_Back)*scaleEdge(size.x/2, EDGE_Rgt))
                                chamferBase(chamfer, size.z);
                        }
                        else if((edges[i] == EDGE_BackLft) || (edges[i] == EDGE_LftBack)){

                            transform(scaleEdge(size.y/2, EDGE_Back)*scaleEdge(size.x/2, EDGE_Lft))
                                chamferBase(chamfer, size.z);
                        }
                        else if((edges[i] == EDGE_FrtRgt) || (edges[i] == EDGE_RgtFrt)){

                            transform(scaleEdge(size.y/2, EDGE_Frt)*scaleEdge(size.x/2, EDGE_Rgt))
                                chamferBase(chamfer, size.z);
                        }
                        else if((edges[i] == EDGE_FrtLft) || (edges[i] == EDGE_LftFrt)){

                            transform(scaleEdge(size.y/2, EDGE_Frt)*scaleEdge(size.x/2, EDGE_Lft))
                                chamferBase(chamfer, size.z);
                        }
                    }
                }
            }
        }
    }
}

//chamferCube(size= [1, 2, 2], chamfer= 0.1, edges= [EDGE_Top, EDGE_Bot]);

//chamferCube(chamfer= 0.2);


module chamferAngBase(chamfer, fs, ang= 45){

    L = chamfer/cos(ang) + 0.02;
    l = chamfer*sin(ang) + 0.02;
    gamma = atan(l/L);
    d = sqrt((L*L + l*l)/4);
    
    A = [d*cos(ang - gamma), -d*sin(ang - gamma), 0];  // A'
    
    B = [chamfer + 0.01*cos(ang), -0.01*sin(ang), 0];  // A"

    mTranslate(makeVector(A, B))
        rotZ(-ang)
            cube([L, l, fs + 0.02], center=true);
}

/*
* chamferCylinder(h: height of the cylinder,
*                 r: radius of the cylinder],
*                 chamfer: chamfer size (chamfer < r/2),
*                 chamferAng: chamfer angle [20, 60],
*                 fn: precision of the cylinder,
*                 pos: position to place the cube,
*                 rot: use sum of constants ROT_* for orient the cylinder OR custom rotation vector as
*                      [angX, angY, anfZ], note that the rotation is in the anti-clockwise direction,
*                 edges: vector of the edges to be chamfered ONLY EDGE_Top or EDGE_Bot,
*                 center: boolean, centrer or not the cube)
*/
module chamferCylinder(h= 1, r= 1, chamfer= 0.1, chamferAng= 45, fn= 50, pos= [0, 0, 0], rot= ROT_Top, edges= [EDGE_Top, EDGE_Bot], center= false){

    assertion(0 < h, "h should be greater than 0");
    assertion(0 < r, "r should be greater than 0");
    assertion((0 < chamfer) && (chamfer < r/2), "chamfer should be greater than 0 and less than r/2");
    assertion((19 < chamferAng) && (chamferAng < 61), "chamferAng should be within [20, 60]°");
    assertion(1 < fn, "fn should be greater than 1");
    assertion(len(pos) == 3, "pos should be a 3D vector");
    assertion(len(rot) == 3, "rot should be a 3D vector");
    assertion(len(edges) != 0, "You should give a vector containing at least one edge constant");

    step = 360/fn;

    mTranslate((center ? pos : pos + [r, r, h/2])){
        mRotate(rot){
            difference(){

                cylinder(r= r, h= h, $fn= fn, center= true);

                for(i= ((len(edges) - 1) == 0 ? [0] : [0 : len(edges) - 1])){
                    
                    if(edges[i] == EDGE_Top){

                        for(j= [0 : fn - 1]){

                            transform(matRotZ((j + 1)*step)*scaleEdge(h/2, EDGE_Top)*scaleEdge(r, EDGE_Rgt)*matRot([90, 0, 180]))
                                chamferAngBase(chamfer, r*tan(step), chamferAng);
                        }
                    }

                    if(edges[i] == EDGE_Bot){

                        for(j= [0 : fn - 1]){

                            transform(matRotZ((j + 1)*step)*scaleEdge(h/2, EDGE_Bot)*scaleEdge(r, EDGE_Rgt)*matRot([90, 180, 0]))
                                chamferAngBase(chamfer, r*tan(step), chamferAng);
                        }
                    }
                }
            }
        }
    }
}

//chamferCylinder(chamferAng= 20,center= true);

//chamferCylinder(r= 2,chamferAng= 20);

//chamferCylinder(h= 3, chamfer= 0.4, edges= [EDGE_Top]);


    // Bevels:

module bevelBase(bevel, size, fn){
    
    mTranslate([bevel/2, bevel/2, 0])
        difference(){
    
            cube([bevel + 0.01, bevel + 0.01, size + 0.01], center= true);
        
            mTranslate([bevel/2, bevel/2, 0])
                cylinder(r= bevel, h= size + 0.02, center= true, $fn= 4*fn);
        }        
}

/*
* bevelCube(size: the size of the cube according to [X, Y, Z],
*           bevel: bevel radius (bevel < min(size)/2),
*           fn: precision of the bevel pitch,
*           pos: position to place the cube,
*           rot: use sum of constants ROT_* for orient the cube OR custom rotation vector as
*                [angX, angY, anfZ], note that the rotation is in the anti-clockwise direction,
*           edges: vector of the edges to be beveled,
*           center: boolean, centrer or not the cube)
*/
module bevelCube(size= [1, 1, 1], bevel= 0.1, fn= 20, pos= [0, 0, 0], rot= ROT_Top, edges= EDGE_All, center= false){

    assertion(len(size) == 3, "size should be a 3D vector");
    for(i= [0 : 2]){

        assertion(0 < size[i], "The size of the cube should be greater than 0");
    }

    assertion((0 < bevel ) && (bevel < min(size)/2), "bevel should be greater than 0 and less than half of the smallest size of the cube");
    assertion(0 < fn, "fn should be greater than 0");
    assertion(len(pos) == 3, "pos should be a 3D vector");
    assertion(len(rot) == 3, "rot should be a 3D vector");
    assertion(len(edges) != 0, "You should give a vector containing at least one edge constant");

    mTranslate((center ? pos : pos + size*1/2)){
        mRotate(rot){
            if(edges == EDGE_All){

                difference(){

                    cube(size, center= true);

                    for(r= [0, 1]){

                        union(){
                            
                                // Top
                            transform(matRotZ(r*180)*scaleEdge(size.z/2, EDGE_Top)*scaleEdge(size.x/2, EDGE_Lft)*matRotX(-90))
                                bevelBase(bevel, size.y, fn);
                                    
                            transform(matRotZ(r*180)*scaleEdge(size.z/2, EDGE_Top)*scaleEdge(size.y/2, EDGE_Frt)*matRotY(90))
                                bevelBase(bevel, size.x, fn);
                            
                                // Bot
                            transform(matRotZ(r*180)*scaleEdge(size.z/2, EDGE_Bot)*scaleEdge(size.y/2, EDGE_Frt)*matRotY(-90))
                                bevelBase(bevel, size.x, fn);
                                
                            transform(matRotZ(r*180)*scaleEdge(size.z/2, EDGE_Bot)*scaleEdge(size.x/2, EDGE_Lft)*matRotX(90))
                                bevelBase(bevel, size.y, fn);
                            
                                // Frt
                            transform(matRotZ(r*180)*scaleEdge(size.y/2, EDGE_Frt)*scaleEdge(size.x/2, EDGE_Rgt)*matRotZ(90))
                                bevelBase(bevel, size.z, fn);

                                // Back
                            transform(matRotZ(r*180)*scaleEdge(size.y/2, EDGE_Frt)*scaleEdge(size.x/2, EDGE_Lft))
                                bevelBase(bevel, size.z, fn);
                        }
                    }
                }
            }
            else{

                difference(){

                    cube(size, center= true);

                    for(i= (((len(edges) - 1) == 0) ? [0] : [0 : len(edges) - 1])){

                        if(edges[i] == EDGE_Top){

                            for(r= [0, 1]){

                                union(){
                                    
                                    transform(matRotZ(r*180)*scaleEdge(size.z/2, EDGE_Top)*scaleEdge(size.x/2, EDGE_Lft)*matRotX(-90))
                                        bevelBase(bevel, size.y, fn);
                                    
                                    transform(matRotZ(r*180)*scaleEdge(size.z/2, EDGE_Top)*scaleEdge(size.y/2, EDGE_Frt)*matRotY(90))
                                        bevelBase(bevel, size.x, fn);
                                }
                                
                            }
                        }
                        else if(edges[i] == EDGE_Bot){

                            for(r= [0, 1]){

                                union(){
                                    
                                    transform(matRotZ(r*180)*scaleEdge(size.z/2, EDGE_Bot)*scaleEdge(size.y/2, EDGE_Frt)*matRotY(-90))
                                        bevelBase(bevel, size.x, fn);
                                
                                    transform(matRotZ(r*180)*scaleEdge(size.z/2, EDGE_Bot)*scaleEdge(size.x/2, EDGE_Lft)*matRotX(90))
                                        bevelBase(bevel, size.y, fn);
                                }
                            }
                        }
                        else if(edges[i] == EDGE_Back){

                            for(r= [0, 1]){

                                union(){
                                    
                                    transform(matRotY(r*180)*scaleEdge(size.z/2, EDGE_Top)*scaleEdge(size.y/2, EDGE_Back)*matRot([0,90,-90]))
                                        bevelBase(bevel, size.x, fn);
                                    
                                    transform(matRotY(r*180)*scaleEdge(size.y/2, EDGE_Back)*scaleEdge(size.x/2, EDGE_Lft)*matRotZ(-90))
                                        bevelBase(bevel, size.z, fn);
                                }
                            }
                        }
                        else if(edges[i] == EDGE_Frt){

                            for(r= [0, 1]){

                                union(){
                                    
                                    transform(matRotY(r*180)*scaleEdge(size.z/2, EDGE_Top)*scaleEdge(size.y/2, EDGE_Frt)*matRotY(90))
                                        bevelBase(bevel, size.x, fn);
                                    
                                    transform(matRotY(r*180)*scaleEdge(size.y/2, EDGE_Frt)*scaleEdge(size.x/2, EDGE_Lft))
                                        bevelBase(bevel, size.z, fn);
                                }
                            }
                        }
                        else if(edges[i] == EDGE_Rgt){

                            for(r= [0, 1]){

                                union(){
                                    
                                    transform(matRotX(r*180)*scaleEdge(size.z/2, EDGE_Top)*scaleEdge(size.x/2, EDGE_Rgt)*matRot([-90, 0, 90]))
                                        bevelBase(bevel, size.y, fn);
                                    
                                    transform(matRotX(r*180)*scaleEdge(size.y/2, EDGE_Frt)*scaleEdge(size.x/2, EDGE_Rgt)*matRotZ(90))
                                        bevelBase(bevel, size.z, fn);   
                                }
                            }
                        }
                        else if(edges[i] == EDGE_Lft){

                            for(r= [0, 1]){

                                union(){
                                    
                                    transform(matRotX(r*180)*scaleEdge(size.z/2, EDGE_Top)*scaleEdge(size.x/2, EDGE_Lft)*matRotX(-90))
                                        bevelBase(bevel, size.y, fn);
                                    
                                    transform(matRotX(r*180)*scaleEdge(size.y/2, EDGE_Frt)*scaleEdge(size.x/2, EDGE_Lft))
                                        bevelBase(bevel, size.z, fn);
                                }
                            }
                        }
                        else if((edges[i] == EDGE_TopBack) || (edges[i] == EDGE_BackTop)){
                            
                            transform(scaleEdge(size.z/2, EDGE_Top)*scaleEdge(size.y/2, EDGE_Back)*matRot([0,90,-90]))
                                bevelBase(bevel, size.x, fn);
                        }
                        else if((edges[i] == EDGE_TopFrt) || (edges[i] == EDGE_FrtTop)){
                            
                            transform(scaleEdge(size.z/2, EDGE_Top)*scaleEdge(size.y/2, EDGE_Frt)*matRotY(90))
                                bevelBase(bevel, size.x, fn);
                        }
                        else if((edges[i] == EDGE_BotBack) || (edges[i] == EDGE_BackBot)){

                            transform(scaleEdge(size.z/2, EDGE_Bot)*scaleEdge(size.y/2, EDGE_Back)*matRot([0, -90, -90]))
                                bevelBase(bevel, size.x, fn);
                        }
                        else if((edges[i] == EDGE_BotFrt) || (edges[i] == EDGE_FrtBot)){

                            transform(scaleEdge(size.z/2, EDGE_Bot)*scaleEdge(size.y/2, EDGE_Frt)*matRotY(-90))
                                bevelBase(bevel, size.x, fn);
                        }
                        else if((edges[i] == EDGE_TopRgt) || (edges[i] == EDGE_RgtTop)){

                            transform(scaleEdge(size.z/2, EDGE_Top)*scaleEdge(size.x/2, EDGE_Rgt)*matRot([-90, 0, 90]))
                                bevelBase(bevel, size.y, fn);
                        }
                        else if((edges[i] == EDGE_TopLft) || (edges[i] == EDGE_LftTop)){

                            transform(scaleEdge(size.z/2, EDGE_Top)*scaleEdge(size.x/2, EDGE_Lft)*matRotX(-90))
                                bevelBase(bevel, size.y, fn);
                        }
                        else if((edges[i] == EDGE_BotRgt) || (edges[i] == EDGE_RgtBot)){

                            transform(scaleEdge(size.z/2, EDGE_Bot)*scaleEdge(size.x/2, EDGE_Rgt)*matRot([90, 0, 90]))
                                bevelBase(bevel, size.y, fn);
                        }
                        else if((edges[i] == EDGE_BotLft) || (edges[i] == EDGE_LftBot)){

                            transform(scaleEdge(size.z/2, EDGE_Bot)*scaleEdge(size.x/2, EDGE_Lft)*matRotX(90))
                                bevelBase(bevel, size.y, fn);
                        }
                        else if((edges[i] == EDGE_BackRgt) || (edges[i] == EDGE_RgtBack)){

                            transform(scaleEdge(size.y/2, EDGE_Back)*scaleEdge(size.x/2, EDGE_Rgt)*matRotZ(180))
                                bevelBase(bevel, size.z, fn);
                        }                
                        else if((edges[i] == EDGE_BackLft) || (edges[i] == EDGE_LftBack)){

                            transform(scaleEdge(size.y/2, EDGE_Back)*scaleEdge(size.x/2, EDGE_Lft)*matRotZ(-90))
                                bevelBase(bevel, size.z, fn);
                        }                
                        else if((edges[i] == EDGE_FrtRgt) || (edges[i] == EDGE_RgtFrt)){

                            transform(scaleEdge(size.y/2, EDGE_Frt)*scaleEdge(size.x/2, EDGE_Rgt)*matRotZ(90))
                                bevelBase(bevel, size.z, fn);
                        }                
                        else if((edges[i] == EDGE_FrtLft) || (edges[i] == EDGE_LftFrt)){

                            transform(scaleEdge(size.y/2, EDGE_Frt)*scaleEdge(size.x/2, EDGE_Lft))
                                bevelBase(bevel, size.z, fn);
                        }
                    }
                }
            }
        }
    }
}

//bevelCube(size= [1, 2, 2], edges= [EDGE_Top, EDGE_Bot]);

//bevelCube(bevel= 0.2);

module cylindBevelBase(r, bevel, fn){

    mTranslate([0, 0, -bevel])
        difference(){

            mTranslate([0, 0, (bevel + 0.01)/2])
                cylinder(r= r*3/2 + 0.01, h= bevel + 0.01, $fn= fn, center= true);

            union(){

                cylinder(r= r - bevel, h= 2*bevel, $fn= fn, center= true);

                rotate_extrude($fn= fn){

                    mTranslate([r - bevel, 0, 0])
                        circle(r= bevel, $fn= fn);
                }
            }
        }
}

/*
* bevelCylinder(h: height of the cylinder,
*               r: radius of the cylinder,
*               bevel: bevel radius (chamfer < r/2),
*               fn: precision of the cylinder pitch,
*               fnB: precision of the bevel pitch,
*               pos: position to place the cube,
*               rot: use sum of constants ROT_* for orient the cylinder OR custom rotation vector as
*                    [angX, angY, anfZ], note that the rotation is in the anti-clockwise direction,
*               edges: vector of the edges to be chamfered ONLY EDGE_Top or EDGE_Bot,
*               center: boolean, centrer or not the cube)
*/
module bevelCylinder(h= 1, r= 1, bevel= 0.1, fn= 20, fnB= 20, pos= [0, 0, 0], rot= ROT_Top, edges= [EDGE_Top, EDGE_Bot], center= false){

    assertion(0 < h, "h should be greater than 0");
    assertion(0 < r, "r should be greater than 0");
    assertion((0 < bevel) && (bevel < r/2), "bevel should be greater than 0 and less than r/2");
    assertion(1 < fn, "fn should be greater than 1");
    assertion(1 < fnB, "fnB chamfer should be greater than 1");
    assertion(len(pos) == 3, "pos should be a 3D vector");
    assertion(len(rot) == 3, "rot should be a 3D vector");
    assertion(len(edges) != 0, "You should give a vector containing at least one edge constant");

    step = 360/fn;
    length= 2*PI*r/fn;

    mTranslate((center ? pos : pos + [r, r, h/2])){
        mRotate(rot){
            difference(){

                cylinder(r= r, h= h, $fn= fn, center= true);

                for(i= ((len(edges) - 1) == 0 ? [0] : [0 : len(edges) - 1])){
                    
                    if(edges[i] == EDGE_Top){
                        
                        mTranslate([0, 0, h/2])
                            cylindBevelBase(r, bevel, fnB);
                    }

                    if(edges[i] == EDGE_Bot){

                        mTranslate([0, 0, -h/2])
                            rotX(180)
                                cylindBevelBase(r, bevel, fnB);
                    }
                }
            }
        }
    }
}

bevelCylinder(r= 0.5);

//bevelCylinder(h= 3, bevel= 0.4, edges= [EDGE_Top]);

    // Linear pipe
/*
*
*              |<--------------->| r
*              |    |<---------->| r1
*                   |____________|  _
*              |    /     /<---->|  A
*              |   /     /   r2  |  |
*                 /     /        |  |   h
*              | /pipe /            |
*              |/_____/__________| _V_
*              /     /           |
*             /thick/
*
 */
/*
* linearPipe(r: bottom outer radius of the pipe,
*            thick: thickness of the pipe,
*            r1: if def, top outer radius of the pipe,
*            r2: if def thickness isn't used, top inner radius of the pipe,
*            h: height of the pipe,
*            pos: position to place the cube,
*            fn: precision of the cylinders,
*            rot: use sum of constants ROT_* for orient the pipe OR custom rotation vector as
*                 [angX, angY, anfZ], note that the rotation is in the anti-clockwise direction,
*            center: center the piece at [0, 0, 0])
*
*  Result:
*   A parametrized linear pipe.
*/
module linearPipe(r= 1, thick= 0.1, r1= undef, r2= undef, h= 1, fn= 50, pos=[0, 0, 0], rot= ROT_Top, center= false){

    assertion(0 < r, "r should be greater than 0");
    assertion(0 < thick, "thick should be greater than 0");
    assertion(0 < h, "h should be greater than 0");
    assertion(0 < fn, "fn should be greater than 0");
    assertion(len(pos) == 3, "pos should be a 3D vector");
    assertion(len(rot) == 3, "rot should be a 3D vector");

    mTranslate(pos){
        mRotate(rot){
            
            if(isDef(r1)){

                assertion(0 < r1, "r1 should be greater than 0");
                difference(){

                    if(isDef(r2)){

                        assertion(r2 < r1, "r1 should be strictly greater than r2");

                        x = tan(atan((r - (r1 - r2) - r2)/h))*0.01;
                        
                        difference(){
                            
                            cylinder(r1= r, r2= r1, h= h, center= center, $fn= fn);
                            
                            mTranslate((center ? [0, 0, 0] : [0, 0, -0.01]))
                                cylinder(r1= r - (r1 - r2) + x, r2= r2 - x, h= h + 0.02, center= center, $fn= fn);
                        }
                    }
                    else{
                        
                        assertion(thick < r1, "r1 should be strictly greater than thick");
                        
                        x = tan(atan((r - thick - (r1 - thick))/h))*0.01;
                        
                        difference(){
                            
                            cylinder(r1= r, r2= r1, h= h, center= center, $fn= fn);
                            
                            mTranslate((center ? [0, 0, 0] : [0, 0, -0.01]))
                                cylinder(r1= r - thick + x, r2= r1 - thick - x, h= h + 0.02, center= center, $fn= fn);
                        }
                    }
                }
            }
            else{
                
                if(isDef(r2)){
                    
                    assertion(r2 < r, "r should be strictly greater than r2");
                    
                    difference(){
                        
                        cylinder(r= r, h= h, center= center, $fn= fn);

                        mTranslate((center ? [0, 0, 0] : [0, 0, -0.01]))
                            cylinder(r= r2, h= h + 0.02, center= center, $fn= fn);
                    }
                }
                else{
                    
                    assertion(thick < r, "r should be strictly greater than thick");
                    
                    difference(){
                        
                        cylinder(r= r, h= h, center= center, $fn= fn);

                        mTranslate((center ? [0, 0, 0] : [0, 0, -0.01]))
                            cylinder(r= r - thick, h= h + 0.02, center= center, $fn= fn);
                    }
                }
                
            }
        }
    }
}

//linearPipe(r= 2, r1= 1, thick= 0.5, h= 10, center= true, rot= ROT_Lft);

//linearPipe(r= 2, r1= 3, r2= 2.9, h= 4, center= true);

/*
* regularIcosahedron(t: length of an edges,
*                  pos: final positionof the regular isocaedre,
*                  rot: use sum of constants ROT_* for orient the pipe OR custom rotation vector as
*                       [angX, angY, anfZ], note that the rotation is in the anti-clockwise direction)
 */
module regularIcosahedron(t= 1, pos= [0, 0, 0], rot= ROT_Top){

    assertion(0 < t, "t should be greater than 0");
    assertion(len(pos) == 3, "pos should be a 3D vector");
    assertion(len(rot) == 3, "rot should be a 3D vector");

    t = t/2;
    phi = (1 + sqrt(5))/2;

    pts = [[-t*phi, -t, 0], [t*phi, -t, 0], [t*phi, t, 0], [-t*phi, t, 0],
            [0, -t*phi, -t], [0, t*phi, -t], [0, t*phi, t], [0, -t*phi, t],
            [t, 0, -t*phi], [-t, 0, -t*phi], [-t, 0, t*phi], [t, 0, t*phi]];

    face = [[0, 3, 10], [0, 3, 9],
            [1, 2, 8], [1, 2, 11],
            [10, 11, 6], [10, 11, 7],
            [4, 7, 1], [4, 7, 0],
            [5, 6, 2], [5, 6, 3],
            [8, 9, 5], [8, 9, 4],
            [0, 7, 10], [0, 9, 4],
            [3, 6, 10], [3, 9, 5],
            [2, 6, 11], [2, 5, 8],
            [1, 7, 11], [1, 4, 8]];

    mTranslate(pos)
        mRotate(rot)
            polyhedron(points= pts, faces= face);
}

//regularIcosahedron(t= 5);
